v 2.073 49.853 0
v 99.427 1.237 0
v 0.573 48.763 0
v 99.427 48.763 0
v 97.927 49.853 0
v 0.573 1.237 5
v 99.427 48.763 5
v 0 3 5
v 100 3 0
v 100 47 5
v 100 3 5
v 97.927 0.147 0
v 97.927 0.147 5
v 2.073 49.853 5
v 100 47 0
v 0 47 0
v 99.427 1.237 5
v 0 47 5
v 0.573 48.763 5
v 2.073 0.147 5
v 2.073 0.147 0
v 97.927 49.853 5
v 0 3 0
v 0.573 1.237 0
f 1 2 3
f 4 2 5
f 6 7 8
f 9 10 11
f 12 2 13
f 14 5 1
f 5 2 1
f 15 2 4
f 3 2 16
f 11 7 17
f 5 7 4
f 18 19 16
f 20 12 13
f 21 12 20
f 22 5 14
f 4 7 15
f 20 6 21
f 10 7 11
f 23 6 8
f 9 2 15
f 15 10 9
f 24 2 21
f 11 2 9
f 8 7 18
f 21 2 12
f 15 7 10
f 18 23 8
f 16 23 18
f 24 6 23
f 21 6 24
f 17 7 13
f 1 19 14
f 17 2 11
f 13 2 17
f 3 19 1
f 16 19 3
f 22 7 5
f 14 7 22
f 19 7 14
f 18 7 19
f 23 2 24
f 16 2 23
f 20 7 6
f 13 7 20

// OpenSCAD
module plate_rounded_corners(h = 50, w = 100, t = 5, r = 3) {
    corner_diameter = r * 2;
    
    hull() {
        for (x = [0, w - corner_diameter],
             y = [0, h - corner_diameter]) {
            translate([x + r, y + r, 0])
                cylinder(h = t, r = r);
        }
    }
}

plate_rounded_corners();
